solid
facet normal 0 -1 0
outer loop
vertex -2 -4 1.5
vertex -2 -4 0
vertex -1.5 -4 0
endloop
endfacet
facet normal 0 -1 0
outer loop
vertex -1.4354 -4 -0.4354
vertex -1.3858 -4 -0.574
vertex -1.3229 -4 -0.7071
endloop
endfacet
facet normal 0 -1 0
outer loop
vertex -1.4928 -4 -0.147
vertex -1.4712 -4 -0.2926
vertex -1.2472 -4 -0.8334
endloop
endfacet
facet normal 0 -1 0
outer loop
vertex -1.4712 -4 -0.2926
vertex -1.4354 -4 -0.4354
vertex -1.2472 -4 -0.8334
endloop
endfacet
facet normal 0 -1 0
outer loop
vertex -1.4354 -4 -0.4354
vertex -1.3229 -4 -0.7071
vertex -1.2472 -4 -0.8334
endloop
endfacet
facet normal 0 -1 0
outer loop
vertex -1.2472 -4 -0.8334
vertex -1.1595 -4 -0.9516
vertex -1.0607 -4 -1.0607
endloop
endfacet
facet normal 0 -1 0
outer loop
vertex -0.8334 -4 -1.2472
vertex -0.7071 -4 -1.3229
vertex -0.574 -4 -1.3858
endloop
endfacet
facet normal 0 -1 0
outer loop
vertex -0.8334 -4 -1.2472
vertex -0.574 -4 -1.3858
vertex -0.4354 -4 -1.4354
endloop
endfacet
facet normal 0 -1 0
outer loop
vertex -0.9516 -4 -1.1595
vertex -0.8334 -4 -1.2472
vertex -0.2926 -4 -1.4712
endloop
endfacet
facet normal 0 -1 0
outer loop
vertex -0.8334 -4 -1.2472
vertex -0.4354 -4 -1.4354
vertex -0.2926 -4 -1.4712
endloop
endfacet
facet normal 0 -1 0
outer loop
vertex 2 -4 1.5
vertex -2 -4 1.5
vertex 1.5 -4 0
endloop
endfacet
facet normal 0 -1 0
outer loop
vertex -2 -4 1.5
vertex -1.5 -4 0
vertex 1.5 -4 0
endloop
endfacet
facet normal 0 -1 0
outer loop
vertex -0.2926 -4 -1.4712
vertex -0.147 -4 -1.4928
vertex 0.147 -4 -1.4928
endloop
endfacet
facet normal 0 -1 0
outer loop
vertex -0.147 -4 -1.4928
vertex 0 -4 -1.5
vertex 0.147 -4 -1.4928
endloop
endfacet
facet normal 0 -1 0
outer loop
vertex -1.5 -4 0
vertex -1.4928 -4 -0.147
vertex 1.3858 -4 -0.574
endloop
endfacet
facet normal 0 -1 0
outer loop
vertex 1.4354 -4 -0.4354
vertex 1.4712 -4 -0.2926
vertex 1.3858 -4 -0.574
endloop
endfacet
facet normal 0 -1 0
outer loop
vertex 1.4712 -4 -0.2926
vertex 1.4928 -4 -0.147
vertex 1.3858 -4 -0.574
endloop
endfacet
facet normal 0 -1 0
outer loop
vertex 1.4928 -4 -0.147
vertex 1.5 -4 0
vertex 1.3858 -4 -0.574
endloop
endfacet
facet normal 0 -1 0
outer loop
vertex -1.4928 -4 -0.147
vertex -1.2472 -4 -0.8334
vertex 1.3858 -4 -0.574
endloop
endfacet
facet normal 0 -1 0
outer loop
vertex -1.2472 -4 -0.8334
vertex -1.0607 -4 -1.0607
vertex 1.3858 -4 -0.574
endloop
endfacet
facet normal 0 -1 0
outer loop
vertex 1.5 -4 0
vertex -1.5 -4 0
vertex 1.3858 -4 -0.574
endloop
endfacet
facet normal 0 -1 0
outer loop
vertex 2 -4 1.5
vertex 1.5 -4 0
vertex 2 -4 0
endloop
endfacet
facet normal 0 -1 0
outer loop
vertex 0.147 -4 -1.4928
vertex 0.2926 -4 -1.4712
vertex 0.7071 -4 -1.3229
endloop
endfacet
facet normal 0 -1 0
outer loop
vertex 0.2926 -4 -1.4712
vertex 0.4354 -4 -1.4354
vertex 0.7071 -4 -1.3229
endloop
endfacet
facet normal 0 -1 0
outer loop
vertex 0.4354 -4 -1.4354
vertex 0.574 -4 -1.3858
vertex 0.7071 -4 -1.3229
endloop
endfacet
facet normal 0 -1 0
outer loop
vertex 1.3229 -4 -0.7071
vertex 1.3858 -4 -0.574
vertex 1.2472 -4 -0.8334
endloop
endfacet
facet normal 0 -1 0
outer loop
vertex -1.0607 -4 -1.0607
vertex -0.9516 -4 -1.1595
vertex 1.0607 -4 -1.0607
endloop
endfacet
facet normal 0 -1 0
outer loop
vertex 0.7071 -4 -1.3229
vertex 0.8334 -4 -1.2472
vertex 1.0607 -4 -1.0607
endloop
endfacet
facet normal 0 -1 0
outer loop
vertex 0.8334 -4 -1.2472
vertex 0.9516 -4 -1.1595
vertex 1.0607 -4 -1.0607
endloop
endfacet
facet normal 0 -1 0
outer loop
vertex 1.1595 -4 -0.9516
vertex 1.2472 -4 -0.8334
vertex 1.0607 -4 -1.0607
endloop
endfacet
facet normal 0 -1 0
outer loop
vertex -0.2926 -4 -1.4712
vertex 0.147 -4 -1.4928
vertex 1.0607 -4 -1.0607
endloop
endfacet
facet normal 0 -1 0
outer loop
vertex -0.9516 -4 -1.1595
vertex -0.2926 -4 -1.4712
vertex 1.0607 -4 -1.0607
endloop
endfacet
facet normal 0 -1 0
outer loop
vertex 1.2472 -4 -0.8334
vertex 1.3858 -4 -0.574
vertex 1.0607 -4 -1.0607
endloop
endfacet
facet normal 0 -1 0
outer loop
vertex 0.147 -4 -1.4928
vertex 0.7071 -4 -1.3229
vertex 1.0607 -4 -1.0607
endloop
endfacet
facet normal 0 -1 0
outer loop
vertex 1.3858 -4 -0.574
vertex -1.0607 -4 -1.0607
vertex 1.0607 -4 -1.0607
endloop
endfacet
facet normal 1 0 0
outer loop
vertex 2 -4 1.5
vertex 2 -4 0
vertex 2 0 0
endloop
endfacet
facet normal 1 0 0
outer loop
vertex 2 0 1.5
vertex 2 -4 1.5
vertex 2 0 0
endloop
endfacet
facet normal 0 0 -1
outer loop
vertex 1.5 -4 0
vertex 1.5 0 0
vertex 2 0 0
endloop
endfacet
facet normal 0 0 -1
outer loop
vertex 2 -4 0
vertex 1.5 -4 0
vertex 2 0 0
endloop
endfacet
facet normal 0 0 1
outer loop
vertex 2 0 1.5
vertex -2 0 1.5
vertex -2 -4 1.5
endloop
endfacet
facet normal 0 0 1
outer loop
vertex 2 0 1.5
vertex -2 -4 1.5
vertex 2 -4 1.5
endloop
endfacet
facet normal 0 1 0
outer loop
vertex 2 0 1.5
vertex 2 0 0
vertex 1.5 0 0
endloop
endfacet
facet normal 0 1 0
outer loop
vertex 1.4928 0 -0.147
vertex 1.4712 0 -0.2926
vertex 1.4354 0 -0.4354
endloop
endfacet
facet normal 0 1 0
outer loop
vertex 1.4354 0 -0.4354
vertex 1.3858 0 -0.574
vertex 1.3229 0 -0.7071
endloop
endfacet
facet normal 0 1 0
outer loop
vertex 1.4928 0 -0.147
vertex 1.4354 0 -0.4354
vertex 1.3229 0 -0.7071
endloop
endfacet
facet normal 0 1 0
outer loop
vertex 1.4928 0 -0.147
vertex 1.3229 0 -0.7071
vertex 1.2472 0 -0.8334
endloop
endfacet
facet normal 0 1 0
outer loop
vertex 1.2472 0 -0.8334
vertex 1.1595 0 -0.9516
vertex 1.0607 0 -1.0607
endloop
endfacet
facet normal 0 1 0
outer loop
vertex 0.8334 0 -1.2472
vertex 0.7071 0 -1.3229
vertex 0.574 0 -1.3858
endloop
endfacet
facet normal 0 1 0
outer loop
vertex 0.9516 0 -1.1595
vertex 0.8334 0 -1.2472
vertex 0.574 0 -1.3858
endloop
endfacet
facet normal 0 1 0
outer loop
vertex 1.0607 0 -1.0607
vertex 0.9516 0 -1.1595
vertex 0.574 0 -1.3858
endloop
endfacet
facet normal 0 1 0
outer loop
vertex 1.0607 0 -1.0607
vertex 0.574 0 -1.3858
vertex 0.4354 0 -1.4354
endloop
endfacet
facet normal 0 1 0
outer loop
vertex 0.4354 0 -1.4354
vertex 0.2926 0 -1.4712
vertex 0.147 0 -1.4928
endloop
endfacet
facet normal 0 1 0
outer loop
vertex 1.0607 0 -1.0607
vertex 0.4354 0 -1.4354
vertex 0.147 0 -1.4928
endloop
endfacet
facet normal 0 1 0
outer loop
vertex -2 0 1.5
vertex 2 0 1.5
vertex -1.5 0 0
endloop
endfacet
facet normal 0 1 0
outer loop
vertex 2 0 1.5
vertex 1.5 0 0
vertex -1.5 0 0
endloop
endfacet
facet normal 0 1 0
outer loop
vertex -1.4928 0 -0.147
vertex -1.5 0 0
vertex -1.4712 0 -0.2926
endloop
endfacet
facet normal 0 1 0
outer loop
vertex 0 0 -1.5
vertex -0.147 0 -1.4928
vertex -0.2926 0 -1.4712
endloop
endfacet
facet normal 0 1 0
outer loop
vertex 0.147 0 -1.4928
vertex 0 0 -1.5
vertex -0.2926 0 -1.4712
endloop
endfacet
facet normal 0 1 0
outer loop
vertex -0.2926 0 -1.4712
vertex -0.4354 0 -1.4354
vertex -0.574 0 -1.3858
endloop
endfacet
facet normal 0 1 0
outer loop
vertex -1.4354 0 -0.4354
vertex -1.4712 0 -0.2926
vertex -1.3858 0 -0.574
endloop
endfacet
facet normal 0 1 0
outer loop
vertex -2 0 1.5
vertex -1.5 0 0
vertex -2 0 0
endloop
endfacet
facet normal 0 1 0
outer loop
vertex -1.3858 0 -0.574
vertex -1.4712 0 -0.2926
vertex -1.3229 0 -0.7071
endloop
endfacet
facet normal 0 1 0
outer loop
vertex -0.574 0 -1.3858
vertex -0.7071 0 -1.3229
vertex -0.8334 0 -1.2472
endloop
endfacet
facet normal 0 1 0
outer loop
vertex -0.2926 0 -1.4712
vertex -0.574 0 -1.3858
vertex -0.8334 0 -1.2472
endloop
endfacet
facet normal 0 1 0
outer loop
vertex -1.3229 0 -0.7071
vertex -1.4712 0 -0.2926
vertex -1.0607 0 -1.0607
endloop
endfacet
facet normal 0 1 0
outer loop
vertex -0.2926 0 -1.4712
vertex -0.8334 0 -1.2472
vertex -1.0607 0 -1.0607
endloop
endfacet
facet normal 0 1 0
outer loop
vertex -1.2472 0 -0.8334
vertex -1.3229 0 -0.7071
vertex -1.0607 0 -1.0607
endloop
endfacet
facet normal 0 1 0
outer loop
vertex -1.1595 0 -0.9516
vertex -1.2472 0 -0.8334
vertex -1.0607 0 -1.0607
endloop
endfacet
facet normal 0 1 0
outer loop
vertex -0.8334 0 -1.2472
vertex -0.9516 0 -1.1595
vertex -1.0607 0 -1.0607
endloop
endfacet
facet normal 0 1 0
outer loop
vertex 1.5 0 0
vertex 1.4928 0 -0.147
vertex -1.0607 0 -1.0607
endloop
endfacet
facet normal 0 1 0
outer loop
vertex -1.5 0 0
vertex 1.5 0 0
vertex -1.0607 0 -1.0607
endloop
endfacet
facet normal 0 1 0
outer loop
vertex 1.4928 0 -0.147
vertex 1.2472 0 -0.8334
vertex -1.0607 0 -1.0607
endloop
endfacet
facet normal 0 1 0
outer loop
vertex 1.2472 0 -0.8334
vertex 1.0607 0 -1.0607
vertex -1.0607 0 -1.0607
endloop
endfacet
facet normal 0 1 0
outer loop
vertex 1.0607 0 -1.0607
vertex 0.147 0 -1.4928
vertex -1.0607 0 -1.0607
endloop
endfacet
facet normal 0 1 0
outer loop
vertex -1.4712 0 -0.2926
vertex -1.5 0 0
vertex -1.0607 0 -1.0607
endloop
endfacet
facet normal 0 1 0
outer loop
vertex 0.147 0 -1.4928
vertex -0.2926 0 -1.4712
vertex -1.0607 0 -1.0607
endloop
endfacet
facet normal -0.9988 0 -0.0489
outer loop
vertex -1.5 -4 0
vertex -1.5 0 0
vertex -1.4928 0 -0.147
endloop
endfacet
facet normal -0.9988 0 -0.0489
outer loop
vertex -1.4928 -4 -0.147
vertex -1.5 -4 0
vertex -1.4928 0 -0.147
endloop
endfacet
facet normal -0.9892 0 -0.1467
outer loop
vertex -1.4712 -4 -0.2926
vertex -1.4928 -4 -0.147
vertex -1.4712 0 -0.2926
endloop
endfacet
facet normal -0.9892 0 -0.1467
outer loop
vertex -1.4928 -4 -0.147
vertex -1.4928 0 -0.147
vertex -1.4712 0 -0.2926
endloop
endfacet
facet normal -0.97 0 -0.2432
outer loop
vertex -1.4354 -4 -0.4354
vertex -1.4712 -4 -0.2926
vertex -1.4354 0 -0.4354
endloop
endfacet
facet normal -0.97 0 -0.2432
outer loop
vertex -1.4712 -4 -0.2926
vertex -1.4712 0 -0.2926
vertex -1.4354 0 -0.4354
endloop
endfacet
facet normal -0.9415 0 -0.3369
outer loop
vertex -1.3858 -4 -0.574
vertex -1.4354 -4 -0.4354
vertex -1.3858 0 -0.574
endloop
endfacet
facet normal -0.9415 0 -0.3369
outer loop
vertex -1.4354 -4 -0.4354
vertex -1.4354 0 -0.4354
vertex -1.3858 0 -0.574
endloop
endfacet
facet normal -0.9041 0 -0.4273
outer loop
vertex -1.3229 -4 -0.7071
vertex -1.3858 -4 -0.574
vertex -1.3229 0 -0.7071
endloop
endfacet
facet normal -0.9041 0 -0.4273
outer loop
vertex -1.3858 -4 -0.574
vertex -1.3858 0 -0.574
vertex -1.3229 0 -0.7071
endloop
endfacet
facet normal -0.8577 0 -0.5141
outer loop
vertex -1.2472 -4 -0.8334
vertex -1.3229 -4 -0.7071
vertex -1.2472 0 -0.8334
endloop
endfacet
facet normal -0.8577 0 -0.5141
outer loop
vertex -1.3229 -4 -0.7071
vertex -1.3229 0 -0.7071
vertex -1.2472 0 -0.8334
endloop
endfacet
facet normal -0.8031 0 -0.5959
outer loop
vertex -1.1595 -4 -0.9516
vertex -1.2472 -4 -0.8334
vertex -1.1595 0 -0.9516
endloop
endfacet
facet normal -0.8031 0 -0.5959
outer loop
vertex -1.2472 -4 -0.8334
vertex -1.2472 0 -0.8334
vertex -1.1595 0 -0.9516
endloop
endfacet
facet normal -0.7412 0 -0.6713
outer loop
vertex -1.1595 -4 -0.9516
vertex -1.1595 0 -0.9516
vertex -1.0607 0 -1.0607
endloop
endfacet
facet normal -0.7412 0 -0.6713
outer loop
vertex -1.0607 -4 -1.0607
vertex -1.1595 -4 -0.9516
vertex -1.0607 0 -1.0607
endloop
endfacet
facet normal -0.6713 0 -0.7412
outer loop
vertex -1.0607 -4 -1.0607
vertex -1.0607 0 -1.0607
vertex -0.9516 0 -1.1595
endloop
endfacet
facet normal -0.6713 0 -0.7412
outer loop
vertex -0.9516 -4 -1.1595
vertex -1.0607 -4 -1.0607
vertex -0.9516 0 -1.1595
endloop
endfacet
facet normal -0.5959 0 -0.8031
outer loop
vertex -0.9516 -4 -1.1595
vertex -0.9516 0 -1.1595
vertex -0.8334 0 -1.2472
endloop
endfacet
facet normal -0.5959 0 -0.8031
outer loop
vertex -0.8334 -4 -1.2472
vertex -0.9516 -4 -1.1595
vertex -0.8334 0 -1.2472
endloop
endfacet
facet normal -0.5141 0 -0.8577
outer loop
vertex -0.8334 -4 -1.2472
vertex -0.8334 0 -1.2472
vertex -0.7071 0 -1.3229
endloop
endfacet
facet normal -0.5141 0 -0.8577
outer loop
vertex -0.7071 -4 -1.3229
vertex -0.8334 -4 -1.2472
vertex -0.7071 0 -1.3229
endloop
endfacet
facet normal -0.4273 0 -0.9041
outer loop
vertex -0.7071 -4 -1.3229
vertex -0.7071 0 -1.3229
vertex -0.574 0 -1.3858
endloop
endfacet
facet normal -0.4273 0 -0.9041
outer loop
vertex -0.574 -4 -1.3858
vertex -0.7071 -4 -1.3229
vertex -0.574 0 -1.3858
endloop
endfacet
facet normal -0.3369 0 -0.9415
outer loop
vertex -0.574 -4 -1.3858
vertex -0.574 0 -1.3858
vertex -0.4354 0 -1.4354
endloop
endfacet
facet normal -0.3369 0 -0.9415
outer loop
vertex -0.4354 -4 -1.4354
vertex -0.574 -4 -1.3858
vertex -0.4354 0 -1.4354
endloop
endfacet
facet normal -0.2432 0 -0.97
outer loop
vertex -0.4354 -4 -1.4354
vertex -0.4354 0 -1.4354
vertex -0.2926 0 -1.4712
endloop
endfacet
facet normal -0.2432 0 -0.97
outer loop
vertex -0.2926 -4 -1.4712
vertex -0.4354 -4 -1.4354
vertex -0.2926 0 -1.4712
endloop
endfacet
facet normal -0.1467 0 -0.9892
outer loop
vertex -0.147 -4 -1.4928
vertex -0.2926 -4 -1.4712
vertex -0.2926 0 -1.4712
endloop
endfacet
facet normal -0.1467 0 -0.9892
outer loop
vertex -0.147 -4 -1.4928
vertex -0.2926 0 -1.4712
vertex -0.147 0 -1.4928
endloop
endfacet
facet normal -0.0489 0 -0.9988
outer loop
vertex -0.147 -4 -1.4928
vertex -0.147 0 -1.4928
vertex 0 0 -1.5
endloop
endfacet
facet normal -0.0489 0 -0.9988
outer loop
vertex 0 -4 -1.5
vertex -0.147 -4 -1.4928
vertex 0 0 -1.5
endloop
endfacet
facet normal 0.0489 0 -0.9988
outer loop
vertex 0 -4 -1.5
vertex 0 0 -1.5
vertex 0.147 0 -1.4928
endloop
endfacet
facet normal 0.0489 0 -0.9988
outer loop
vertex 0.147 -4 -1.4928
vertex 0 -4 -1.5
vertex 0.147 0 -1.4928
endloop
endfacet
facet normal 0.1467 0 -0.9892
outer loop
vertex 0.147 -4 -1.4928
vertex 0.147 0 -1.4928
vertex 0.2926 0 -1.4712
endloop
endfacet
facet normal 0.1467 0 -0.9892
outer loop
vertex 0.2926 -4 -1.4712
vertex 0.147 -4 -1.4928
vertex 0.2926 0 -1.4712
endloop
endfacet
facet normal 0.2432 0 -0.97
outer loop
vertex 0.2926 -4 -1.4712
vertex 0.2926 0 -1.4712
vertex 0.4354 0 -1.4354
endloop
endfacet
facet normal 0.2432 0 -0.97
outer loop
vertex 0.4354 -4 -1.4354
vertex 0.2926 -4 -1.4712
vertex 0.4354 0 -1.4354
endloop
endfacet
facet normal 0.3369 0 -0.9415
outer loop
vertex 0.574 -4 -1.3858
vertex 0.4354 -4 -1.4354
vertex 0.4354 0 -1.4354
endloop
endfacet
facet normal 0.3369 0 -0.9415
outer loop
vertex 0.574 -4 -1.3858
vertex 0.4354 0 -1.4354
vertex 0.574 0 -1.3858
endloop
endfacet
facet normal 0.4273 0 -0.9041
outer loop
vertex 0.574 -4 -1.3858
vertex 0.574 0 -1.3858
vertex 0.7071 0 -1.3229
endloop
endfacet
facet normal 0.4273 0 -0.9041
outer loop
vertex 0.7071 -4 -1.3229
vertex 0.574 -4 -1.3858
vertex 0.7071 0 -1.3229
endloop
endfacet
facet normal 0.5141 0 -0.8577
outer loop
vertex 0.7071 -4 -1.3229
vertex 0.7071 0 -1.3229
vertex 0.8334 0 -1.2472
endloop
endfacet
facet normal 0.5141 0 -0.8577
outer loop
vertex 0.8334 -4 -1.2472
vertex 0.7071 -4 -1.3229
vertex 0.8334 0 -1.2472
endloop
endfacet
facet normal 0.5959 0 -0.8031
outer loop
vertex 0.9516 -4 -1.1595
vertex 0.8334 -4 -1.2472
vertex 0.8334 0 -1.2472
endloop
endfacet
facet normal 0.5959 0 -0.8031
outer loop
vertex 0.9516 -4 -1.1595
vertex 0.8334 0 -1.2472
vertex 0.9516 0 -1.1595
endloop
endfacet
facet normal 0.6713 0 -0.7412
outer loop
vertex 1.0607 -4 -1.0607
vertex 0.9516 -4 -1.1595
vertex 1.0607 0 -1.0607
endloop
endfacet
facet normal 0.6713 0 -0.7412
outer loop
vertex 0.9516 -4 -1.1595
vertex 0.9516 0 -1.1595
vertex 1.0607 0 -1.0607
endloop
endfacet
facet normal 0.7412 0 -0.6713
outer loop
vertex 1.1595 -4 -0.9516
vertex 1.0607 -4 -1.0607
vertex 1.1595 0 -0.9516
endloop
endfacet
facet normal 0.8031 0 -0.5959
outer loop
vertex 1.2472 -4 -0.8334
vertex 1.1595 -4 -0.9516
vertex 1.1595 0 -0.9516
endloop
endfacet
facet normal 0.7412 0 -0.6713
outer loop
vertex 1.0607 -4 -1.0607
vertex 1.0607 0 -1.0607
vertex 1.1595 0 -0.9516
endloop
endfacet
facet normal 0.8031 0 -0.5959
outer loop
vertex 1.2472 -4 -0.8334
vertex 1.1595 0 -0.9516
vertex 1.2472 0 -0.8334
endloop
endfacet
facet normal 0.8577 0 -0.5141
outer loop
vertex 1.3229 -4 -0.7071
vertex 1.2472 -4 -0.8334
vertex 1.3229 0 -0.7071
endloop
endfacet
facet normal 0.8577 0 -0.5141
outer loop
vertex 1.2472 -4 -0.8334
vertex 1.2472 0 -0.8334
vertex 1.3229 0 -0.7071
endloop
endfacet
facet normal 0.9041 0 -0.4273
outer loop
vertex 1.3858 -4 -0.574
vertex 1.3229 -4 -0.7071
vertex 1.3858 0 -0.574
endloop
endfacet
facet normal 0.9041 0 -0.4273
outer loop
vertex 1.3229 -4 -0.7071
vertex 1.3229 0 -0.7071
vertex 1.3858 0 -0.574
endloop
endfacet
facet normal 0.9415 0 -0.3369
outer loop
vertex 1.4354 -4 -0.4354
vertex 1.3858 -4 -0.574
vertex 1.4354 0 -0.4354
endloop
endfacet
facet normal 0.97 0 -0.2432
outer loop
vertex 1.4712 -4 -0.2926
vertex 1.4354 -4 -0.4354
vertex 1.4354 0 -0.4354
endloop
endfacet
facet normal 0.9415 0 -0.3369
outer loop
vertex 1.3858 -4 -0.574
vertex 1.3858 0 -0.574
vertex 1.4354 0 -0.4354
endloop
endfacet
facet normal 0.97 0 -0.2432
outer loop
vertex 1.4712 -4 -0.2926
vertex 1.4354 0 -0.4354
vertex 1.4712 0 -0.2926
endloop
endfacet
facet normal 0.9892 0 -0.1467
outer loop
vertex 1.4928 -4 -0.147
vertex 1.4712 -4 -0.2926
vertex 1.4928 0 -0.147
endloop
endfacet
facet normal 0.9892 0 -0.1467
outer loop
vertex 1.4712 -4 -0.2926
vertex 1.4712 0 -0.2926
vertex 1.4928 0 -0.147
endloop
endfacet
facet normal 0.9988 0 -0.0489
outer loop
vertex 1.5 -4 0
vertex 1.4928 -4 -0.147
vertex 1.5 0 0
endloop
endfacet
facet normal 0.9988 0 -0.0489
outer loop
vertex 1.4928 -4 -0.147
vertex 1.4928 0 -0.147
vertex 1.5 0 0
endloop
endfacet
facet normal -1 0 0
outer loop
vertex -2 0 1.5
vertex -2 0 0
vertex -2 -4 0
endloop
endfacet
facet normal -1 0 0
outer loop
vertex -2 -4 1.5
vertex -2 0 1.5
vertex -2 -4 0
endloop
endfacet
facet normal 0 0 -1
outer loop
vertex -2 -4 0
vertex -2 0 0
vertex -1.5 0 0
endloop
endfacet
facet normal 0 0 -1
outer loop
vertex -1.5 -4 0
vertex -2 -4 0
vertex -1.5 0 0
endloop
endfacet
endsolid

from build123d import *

# Parameters (mm, degrees)
F0_R     = 1.5
F1_DEPTH = 4
F3_DEPTH = 1.5


with BuildPart() as f1:
    # F0 (on Front) → F1 (new body)
    with BuildSketch(Plane.XZ):
        Circle(F0_R)
    extrude(amount=F1_DEPTH)

    # F2 (on Top) → F3 (join)
    with BuildSketch(Plane.XY):
        Polygon((2, 0), (0, 0), (0, -3), (0, -4), (2, -4), align=None)
        Polygon((0, -3), (0, 0), (-2, 0), (-2, -4), (0, -4), align=None)
    extrude(amount=F3_DEPTH)


solid = f1.part
